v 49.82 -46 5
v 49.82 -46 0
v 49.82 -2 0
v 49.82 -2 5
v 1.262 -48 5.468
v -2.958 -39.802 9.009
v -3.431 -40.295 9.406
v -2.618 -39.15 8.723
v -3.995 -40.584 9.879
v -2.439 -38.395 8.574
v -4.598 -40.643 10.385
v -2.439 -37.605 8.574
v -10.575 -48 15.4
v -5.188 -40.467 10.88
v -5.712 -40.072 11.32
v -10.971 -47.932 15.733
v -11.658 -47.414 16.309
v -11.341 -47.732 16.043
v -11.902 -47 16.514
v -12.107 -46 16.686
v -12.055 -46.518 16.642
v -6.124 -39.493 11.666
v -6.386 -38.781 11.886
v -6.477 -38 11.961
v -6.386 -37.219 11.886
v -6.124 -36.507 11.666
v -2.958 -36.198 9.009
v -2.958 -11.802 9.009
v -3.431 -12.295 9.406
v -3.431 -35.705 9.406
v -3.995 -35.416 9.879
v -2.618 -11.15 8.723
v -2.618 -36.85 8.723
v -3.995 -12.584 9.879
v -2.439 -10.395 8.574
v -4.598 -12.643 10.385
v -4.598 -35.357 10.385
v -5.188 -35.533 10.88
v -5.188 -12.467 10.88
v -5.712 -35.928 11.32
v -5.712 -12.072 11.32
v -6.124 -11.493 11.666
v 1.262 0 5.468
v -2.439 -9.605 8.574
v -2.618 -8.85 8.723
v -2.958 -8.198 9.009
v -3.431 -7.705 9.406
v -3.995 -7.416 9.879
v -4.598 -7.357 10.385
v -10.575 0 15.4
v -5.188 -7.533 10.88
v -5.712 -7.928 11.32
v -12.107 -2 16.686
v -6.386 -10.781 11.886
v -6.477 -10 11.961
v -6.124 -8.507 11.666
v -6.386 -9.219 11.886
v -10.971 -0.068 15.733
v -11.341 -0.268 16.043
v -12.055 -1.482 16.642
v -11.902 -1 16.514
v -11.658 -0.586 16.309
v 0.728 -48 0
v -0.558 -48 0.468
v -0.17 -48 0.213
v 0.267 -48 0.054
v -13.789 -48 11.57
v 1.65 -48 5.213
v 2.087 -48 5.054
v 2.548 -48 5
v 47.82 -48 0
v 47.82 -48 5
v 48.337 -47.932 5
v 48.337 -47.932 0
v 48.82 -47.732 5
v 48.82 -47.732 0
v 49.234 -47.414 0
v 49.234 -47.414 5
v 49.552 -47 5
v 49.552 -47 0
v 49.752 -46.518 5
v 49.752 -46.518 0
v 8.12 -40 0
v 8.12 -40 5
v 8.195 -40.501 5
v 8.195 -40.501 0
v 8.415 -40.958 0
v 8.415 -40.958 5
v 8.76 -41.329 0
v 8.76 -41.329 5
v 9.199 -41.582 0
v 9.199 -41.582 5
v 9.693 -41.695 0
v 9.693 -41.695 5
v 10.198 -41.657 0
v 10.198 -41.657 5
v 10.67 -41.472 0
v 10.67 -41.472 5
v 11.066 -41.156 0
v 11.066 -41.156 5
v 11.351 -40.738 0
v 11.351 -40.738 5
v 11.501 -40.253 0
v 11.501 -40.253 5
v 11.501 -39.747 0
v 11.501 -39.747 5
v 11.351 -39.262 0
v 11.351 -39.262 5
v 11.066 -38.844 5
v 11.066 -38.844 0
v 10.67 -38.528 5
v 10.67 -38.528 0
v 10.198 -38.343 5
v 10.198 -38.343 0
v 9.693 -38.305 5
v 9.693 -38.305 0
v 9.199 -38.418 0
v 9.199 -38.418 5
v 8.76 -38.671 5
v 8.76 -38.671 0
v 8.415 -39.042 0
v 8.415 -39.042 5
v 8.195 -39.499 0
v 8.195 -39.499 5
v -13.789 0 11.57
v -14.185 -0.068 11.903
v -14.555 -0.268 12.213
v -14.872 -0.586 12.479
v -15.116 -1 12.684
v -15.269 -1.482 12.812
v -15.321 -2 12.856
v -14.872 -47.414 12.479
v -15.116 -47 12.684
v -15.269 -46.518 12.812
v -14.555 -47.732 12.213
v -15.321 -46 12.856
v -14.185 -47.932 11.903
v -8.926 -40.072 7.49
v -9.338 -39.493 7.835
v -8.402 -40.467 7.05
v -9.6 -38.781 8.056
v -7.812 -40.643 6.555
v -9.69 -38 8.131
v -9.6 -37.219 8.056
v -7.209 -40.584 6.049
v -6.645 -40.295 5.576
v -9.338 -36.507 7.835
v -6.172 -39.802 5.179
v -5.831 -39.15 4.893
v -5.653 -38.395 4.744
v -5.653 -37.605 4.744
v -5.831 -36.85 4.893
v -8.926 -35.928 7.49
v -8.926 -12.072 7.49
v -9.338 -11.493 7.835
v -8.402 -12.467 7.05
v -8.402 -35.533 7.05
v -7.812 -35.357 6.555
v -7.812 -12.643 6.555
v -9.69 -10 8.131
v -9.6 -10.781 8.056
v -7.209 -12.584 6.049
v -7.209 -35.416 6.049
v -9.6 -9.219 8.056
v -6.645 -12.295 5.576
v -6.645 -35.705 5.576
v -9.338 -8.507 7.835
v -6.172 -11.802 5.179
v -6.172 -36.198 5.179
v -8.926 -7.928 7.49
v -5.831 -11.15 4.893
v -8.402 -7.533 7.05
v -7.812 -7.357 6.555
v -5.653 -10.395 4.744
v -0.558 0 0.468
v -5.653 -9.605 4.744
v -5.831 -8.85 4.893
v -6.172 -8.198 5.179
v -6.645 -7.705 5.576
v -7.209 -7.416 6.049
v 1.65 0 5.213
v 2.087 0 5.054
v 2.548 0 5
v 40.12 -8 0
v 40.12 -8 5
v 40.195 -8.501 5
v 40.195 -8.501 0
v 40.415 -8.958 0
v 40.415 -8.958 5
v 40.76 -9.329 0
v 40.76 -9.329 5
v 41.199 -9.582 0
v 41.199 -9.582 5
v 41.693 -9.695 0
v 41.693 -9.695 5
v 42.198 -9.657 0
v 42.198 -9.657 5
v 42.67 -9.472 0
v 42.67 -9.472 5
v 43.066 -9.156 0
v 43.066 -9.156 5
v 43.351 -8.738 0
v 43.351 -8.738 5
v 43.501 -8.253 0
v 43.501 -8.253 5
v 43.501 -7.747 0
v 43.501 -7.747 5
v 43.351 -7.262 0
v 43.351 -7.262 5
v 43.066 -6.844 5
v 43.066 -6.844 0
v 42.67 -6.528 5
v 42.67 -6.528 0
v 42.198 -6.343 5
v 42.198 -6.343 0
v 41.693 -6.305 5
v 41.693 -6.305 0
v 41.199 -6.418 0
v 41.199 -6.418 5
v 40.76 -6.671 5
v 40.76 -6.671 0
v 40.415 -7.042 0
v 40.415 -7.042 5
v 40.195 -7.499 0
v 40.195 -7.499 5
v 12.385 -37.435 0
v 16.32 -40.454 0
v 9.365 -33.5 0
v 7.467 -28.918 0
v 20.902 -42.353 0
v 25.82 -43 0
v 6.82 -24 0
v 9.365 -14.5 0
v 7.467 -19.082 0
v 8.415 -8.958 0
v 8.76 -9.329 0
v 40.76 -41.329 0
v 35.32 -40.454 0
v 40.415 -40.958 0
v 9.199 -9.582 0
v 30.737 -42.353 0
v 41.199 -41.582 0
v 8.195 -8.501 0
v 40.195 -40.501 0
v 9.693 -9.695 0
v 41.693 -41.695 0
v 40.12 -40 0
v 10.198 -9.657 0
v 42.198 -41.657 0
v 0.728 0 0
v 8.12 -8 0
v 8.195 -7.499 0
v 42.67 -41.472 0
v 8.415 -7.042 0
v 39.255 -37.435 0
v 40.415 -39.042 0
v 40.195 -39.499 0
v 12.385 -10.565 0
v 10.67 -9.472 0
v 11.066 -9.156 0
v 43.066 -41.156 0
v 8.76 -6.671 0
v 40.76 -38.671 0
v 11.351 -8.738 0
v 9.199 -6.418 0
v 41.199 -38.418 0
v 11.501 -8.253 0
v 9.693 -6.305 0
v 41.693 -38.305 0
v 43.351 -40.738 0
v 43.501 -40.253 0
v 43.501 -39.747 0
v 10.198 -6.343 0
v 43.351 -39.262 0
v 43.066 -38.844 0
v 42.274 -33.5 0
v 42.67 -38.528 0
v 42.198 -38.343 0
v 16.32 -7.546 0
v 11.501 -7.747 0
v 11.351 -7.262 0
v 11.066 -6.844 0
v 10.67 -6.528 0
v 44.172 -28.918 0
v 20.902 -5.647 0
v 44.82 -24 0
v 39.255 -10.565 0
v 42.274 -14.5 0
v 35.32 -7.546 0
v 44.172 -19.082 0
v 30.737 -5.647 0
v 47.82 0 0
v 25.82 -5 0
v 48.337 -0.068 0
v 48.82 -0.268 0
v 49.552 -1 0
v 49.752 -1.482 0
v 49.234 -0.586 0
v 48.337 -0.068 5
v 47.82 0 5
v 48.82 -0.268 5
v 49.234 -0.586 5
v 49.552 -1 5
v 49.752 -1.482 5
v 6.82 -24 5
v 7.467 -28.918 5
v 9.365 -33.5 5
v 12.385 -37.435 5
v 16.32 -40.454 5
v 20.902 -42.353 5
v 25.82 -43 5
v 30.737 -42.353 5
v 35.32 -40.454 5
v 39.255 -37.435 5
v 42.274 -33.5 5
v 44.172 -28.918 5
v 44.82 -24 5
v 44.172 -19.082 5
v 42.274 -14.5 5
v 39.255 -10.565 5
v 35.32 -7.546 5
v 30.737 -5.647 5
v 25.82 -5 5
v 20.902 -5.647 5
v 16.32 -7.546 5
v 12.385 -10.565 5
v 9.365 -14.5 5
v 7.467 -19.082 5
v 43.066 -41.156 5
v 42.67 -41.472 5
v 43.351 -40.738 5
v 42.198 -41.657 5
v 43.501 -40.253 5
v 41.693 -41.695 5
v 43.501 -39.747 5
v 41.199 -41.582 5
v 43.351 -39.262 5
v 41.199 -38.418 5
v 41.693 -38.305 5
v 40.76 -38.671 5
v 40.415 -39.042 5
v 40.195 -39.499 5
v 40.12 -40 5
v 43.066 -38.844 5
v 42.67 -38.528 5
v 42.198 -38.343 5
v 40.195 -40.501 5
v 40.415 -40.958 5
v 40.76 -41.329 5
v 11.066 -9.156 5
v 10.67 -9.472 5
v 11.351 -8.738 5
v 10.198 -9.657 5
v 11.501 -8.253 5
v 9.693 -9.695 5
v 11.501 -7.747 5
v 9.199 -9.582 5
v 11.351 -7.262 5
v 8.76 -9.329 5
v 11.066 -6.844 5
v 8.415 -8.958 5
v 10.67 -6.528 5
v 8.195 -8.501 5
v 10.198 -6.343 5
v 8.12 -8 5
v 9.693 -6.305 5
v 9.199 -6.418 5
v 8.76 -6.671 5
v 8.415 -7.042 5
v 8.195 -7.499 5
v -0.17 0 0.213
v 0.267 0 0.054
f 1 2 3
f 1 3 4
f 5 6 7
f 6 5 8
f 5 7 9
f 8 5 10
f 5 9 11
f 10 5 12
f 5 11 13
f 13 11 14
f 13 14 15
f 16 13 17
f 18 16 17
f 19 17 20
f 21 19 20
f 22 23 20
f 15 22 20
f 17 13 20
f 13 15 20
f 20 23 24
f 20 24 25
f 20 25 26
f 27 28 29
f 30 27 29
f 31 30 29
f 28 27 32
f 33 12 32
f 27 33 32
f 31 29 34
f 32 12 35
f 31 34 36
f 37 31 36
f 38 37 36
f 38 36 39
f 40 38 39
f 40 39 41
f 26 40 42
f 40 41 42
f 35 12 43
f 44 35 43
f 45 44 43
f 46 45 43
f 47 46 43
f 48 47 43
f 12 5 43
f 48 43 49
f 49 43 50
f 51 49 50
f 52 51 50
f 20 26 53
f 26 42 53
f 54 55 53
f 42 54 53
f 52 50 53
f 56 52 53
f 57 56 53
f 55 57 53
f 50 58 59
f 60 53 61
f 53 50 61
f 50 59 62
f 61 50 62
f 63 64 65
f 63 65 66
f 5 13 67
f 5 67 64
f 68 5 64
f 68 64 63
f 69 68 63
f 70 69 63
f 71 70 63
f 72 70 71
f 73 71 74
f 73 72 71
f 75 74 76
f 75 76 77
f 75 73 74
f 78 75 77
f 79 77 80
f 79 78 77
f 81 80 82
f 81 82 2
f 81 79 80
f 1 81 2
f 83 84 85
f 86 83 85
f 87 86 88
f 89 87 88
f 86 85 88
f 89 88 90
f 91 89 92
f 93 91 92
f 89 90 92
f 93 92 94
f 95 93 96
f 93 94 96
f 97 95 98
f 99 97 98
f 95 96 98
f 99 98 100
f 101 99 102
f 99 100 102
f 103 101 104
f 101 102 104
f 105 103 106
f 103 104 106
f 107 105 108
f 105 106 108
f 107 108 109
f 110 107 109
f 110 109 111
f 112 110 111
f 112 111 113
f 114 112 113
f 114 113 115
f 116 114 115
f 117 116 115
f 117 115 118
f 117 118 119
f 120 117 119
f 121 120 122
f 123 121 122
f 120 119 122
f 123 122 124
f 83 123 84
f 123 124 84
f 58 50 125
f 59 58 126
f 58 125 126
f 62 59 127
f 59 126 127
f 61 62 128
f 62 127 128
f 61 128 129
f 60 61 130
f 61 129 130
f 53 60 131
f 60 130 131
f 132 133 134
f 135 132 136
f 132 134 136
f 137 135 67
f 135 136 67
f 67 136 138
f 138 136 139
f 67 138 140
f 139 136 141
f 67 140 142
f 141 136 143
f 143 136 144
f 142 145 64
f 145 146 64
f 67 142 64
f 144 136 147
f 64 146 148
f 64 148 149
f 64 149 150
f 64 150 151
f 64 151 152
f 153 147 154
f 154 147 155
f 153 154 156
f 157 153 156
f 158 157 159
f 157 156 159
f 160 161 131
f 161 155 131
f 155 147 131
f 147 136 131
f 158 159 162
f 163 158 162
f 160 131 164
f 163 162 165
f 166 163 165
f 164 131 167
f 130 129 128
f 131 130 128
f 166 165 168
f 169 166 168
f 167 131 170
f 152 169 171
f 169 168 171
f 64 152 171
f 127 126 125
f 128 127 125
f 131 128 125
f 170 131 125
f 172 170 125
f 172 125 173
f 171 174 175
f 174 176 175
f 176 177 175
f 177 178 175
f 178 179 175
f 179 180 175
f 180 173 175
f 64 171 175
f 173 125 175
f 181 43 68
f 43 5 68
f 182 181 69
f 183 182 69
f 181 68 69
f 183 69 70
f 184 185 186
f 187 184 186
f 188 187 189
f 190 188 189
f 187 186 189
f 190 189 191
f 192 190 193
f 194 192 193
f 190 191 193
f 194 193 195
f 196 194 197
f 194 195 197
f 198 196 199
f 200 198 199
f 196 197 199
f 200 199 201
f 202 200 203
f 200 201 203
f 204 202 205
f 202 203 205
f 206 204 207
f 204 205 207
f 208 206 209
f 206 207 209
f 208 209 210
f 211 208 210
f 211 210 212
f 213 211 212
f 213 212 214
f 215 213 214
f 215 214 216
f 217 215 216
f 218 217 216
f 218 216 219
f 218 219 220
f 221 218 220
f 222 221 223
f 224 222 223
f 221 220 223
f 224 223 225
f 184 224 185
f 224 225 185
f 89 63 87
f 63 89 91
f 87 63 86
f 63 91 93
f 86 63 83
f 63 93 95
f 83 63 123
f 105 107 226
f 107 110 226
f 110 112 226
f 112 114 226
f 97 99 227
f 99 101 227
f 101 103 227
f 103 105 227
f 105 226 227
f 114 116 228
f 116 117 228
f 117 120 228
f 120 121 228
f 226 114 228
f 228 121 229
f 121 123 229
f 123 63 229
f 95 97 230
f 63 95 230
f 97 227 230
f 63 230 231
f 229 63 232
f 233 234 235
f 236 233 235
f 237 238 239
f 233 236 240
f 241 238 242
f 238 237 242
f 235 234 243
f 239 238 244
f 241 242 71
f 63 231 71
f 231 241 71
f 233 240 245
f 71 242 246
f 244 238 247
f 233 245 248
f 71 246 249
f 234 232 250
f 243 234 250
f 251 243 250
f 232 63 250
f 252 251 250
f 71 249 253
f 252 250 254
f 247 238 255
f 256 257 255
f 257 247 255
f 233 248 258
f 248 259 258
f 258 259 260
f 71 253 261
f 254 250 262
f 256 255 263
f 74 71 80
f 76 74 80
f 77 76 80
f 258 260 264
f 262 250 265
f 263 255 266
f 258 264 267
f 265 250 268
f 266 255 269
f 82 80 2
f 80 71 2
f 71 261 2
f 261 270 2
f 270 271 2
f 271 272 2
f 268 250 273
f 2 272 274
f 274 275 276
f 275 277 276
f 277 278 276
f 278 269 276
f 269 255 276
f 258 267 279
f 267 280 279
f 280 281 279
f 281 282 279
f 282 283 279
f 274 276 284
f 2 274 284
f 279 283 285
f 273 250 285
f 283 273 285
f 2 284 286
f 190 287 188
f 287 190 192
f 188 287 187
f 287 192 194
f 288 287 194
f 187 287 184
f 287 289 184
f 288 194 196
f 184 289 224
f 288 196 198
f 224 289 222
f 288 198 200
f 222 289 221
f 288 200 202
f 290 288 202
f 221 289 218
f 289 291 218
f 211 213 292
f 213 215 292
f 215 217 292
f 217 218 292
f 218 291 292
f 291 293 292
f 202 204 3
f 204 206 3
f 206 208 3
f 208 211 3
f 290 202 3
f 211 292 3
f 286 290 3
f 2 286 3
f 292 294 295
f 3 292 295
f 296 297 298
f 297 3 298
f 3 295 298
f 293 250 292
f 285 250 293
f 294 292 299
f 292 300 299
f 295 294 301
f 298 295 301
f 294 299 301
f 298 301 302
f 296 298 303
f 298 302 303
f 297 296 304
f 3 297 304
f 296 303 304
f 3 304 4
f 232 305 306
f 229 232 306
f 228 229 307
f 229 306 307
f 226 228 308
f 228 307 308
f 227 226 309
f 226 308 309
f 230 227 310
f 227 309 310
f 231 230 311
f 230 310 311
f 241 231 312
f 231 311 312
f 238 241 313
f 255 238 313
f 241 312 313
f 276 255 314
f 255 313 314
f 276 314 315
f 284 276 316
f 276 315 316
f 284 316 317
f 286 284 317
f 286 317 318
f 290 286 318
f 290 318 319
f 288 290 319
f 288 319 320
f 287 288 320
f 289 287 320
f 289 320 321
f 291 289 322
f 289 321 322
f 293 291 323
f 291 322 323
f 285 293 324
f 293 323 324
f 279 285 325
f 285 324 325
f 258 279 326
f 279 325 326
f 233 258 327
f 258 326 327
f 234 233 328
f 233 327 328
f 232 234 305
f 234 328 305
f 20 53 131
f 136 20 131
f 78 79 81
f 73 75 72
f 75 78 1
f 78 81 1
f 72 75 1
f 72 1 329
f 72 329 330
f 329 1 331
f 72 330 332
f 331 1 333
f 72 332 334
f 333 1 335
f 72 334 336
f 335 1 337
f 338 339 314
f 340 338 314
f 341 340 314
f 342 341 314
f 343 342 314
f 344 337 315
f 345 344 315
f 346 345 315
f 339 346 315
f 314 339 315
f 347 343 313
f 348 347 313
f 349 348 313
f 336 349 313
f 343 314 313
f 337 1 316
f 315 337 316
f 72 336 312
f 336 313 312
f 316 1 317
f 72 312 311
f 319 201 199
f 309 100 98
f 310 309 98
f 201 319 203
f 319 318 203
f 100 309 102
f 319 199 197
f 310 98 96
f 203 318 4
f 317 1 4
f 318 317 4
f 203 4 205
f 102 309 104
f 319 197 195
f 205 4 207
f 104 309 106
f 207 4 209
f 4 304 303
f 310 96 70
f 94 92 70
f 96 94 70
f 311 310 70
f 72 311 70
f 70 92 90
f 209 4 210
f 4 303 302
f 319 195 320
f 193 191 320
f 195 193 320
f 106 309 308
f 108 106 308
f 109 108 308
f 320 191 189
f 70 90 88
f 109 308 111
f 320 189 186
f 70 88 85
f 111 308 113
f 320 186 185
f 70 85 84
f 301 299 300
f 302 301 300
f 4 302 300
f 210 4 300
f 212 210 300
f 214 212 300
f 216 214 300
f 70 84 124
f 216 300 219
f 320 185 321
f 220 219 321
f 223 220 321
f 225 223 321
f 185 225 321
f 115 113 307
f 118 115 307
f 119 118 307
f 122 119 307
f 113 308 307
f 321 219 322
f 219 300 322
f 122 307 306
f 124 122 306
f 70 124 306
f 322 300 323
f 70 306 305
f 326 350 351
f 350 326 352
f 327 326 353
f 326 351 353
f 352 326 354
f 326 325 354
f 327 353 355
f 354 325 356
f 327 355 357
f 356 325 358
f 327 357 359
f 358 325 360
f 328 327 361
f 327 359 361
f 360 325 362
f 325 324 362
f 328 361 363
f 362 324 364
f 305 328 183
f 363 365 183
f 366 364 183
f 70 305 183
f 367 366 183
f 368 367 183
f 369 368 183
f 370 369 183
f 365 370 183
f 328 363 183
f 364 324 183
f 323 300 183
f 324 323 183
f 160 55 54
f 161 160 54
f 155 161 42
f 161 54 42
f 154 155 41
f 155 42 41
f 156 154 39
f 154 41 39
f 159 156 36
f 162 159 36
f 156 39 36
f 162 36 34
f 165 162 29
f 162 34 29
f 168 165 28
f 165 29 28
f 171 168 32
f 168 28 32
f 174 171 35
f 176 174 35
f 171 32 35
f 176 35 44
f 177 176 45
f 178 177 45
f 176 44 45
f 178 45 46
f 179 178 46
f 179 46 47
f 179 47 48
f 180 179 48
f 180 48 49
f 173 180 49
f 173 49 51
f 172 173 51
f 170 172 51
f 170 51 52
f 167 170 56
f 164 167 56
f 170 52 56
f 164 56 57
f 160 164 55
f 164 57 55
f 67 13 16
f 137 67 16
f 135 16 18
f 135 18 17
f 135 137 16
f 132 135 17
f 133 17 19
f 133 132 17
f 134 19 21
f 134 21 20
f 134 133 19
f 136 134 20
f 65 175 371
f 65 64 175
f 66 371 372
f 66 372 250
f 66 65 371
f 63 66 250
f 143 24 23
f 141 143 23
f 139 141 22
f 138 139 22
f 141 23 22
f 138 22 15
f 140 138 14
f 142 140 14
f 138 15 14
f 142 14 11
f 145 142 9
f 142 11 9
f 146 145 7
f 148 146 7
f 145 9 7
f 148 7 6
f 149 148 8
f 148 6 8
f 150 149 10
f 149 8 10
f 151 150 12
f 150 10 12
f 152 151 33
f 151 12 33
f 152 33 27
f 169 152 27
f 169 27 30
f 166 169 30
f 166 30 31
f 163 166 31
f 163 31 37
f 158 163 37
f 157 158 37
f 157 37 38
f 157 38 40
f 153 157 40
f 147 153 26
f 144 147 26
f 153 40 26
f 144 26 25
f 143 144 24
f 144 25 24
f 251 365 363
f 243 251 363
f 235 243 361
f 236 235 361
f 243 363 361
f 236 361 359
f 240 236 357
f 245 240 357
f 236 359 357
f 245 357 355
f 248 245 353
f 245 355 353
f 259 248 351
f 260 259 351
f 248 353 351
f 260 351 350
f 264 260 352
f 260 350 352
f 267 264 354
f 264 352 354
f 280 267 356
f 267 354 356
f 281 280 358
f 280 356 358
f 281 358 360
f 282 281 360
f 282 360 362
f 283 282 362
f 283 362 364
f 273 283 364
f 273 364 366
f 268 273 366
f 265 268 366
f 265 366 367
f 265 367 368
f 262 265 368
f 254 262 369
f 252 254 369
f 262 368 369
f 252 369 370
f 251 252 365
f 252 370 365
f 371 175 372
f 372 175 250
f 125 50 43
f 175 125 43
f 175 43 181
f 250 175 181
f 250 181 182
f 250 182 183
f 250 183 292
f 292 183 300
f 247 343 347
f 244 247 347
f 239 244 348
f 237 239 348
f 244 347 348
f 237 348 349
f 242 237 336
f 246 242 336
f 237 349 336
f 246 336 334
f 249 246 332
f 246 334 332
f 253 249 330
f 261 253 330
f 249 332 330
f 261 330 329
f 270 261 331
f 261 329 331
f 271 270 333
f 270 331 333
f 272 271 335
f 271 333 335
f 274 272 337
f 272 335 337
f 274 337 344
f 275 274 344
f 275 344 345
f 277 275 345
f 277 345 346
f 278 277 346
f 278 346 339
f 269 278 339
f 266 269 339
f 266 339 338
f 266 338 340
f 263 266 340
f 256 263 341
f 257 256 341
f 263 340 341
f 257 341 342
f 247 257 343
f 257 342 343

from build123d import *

# Parameters (mm, degrees)
F1_DEPTH = 48
F2_R     = 2.65
F3_DEPTH = 5
F4_R     = 19
F4_R_2   = 1.7
F5_DEPTH = 5
F6_ANGLE = 40
F7_ANGLE = 90
F8_R     = 2


with BuildPart() as f1:
    # F0 (on Top) → F1 (new body)
    with BuildSketch(Plane.XY):
        Polygon((-1.8198511713, 5), (-20, 5), (-20, 0), (0, 0), (38.1642201468, 32.0235830494), (34.9502820984, 35.853805265), align=None)
    extrude(amount=F1_DEPTH)

    # F2 (on face) → F3 (cut, through all)
    with BuildSketch(Plane(origin=(0, 5, 0), x_dir=(-1, 0, 0), z_dir=(0, 1, 0))):
        with Locations((10, 10)):
            Circle(F2_R)
        with Locations((10, 38)):
            Circle(F2_R)
    extrude(amount=-F3_DEPTH, mode=Mode.SUBTRACT)

    # F4 (on face) → F5 (cut, through all)
    with BuildSketch(Plane(origin=(-3.2139380484, 3.8302222156, 0), x_dir=(-0.7660444431, -0.6427876097, 0), z_dir=(-0.6427876097, 0.7660444431, 0))):
        with Locations((-25.8198511713, 24)):
            Circle(F4_R)
        with Locations((-9.8198511713, 40)):
            Circle(F4_R_2)
        with Locations((-9.8198511713, 8)):
            Circle(F4_R_2)
        with Locations((-41.8198511713, 8)):
            Circle(F4_R_2)
        with Locations((-41.8198511713, 40)):
            Circle(F4_R_2)
    extrude(amount=-F5_DEPTH, mode=Mode.SUBTRACT)


with BuildPart() as f1_1:
    # F6: moved
    add(f1.part.rotate(Axis((0, 0, 24), (0, 0, -1)), F6_ANGLE))


with BuildPart() as f1_2:
    # F7: moved
    add(f1_1.part.rotate(Axis((24.9099255857, 0, 0), (1, 0, 0)), F7_ANGLE))

    # F8
    f8_edges = [f1_2.edges().sort_by_distance(p)[0] for p in [
        (1.819851, -24, 5),
        (0, -24, 0),
        (-13.71392, 0, 14.770863),
        (-13.71392, -48, 14.770863),
        (49.819851, 0, 2.5),
        (49.819851, -48, 2.5),
    ]]
    fillet(f8_edges, radius=F8_R)


solid = f1_2.part
